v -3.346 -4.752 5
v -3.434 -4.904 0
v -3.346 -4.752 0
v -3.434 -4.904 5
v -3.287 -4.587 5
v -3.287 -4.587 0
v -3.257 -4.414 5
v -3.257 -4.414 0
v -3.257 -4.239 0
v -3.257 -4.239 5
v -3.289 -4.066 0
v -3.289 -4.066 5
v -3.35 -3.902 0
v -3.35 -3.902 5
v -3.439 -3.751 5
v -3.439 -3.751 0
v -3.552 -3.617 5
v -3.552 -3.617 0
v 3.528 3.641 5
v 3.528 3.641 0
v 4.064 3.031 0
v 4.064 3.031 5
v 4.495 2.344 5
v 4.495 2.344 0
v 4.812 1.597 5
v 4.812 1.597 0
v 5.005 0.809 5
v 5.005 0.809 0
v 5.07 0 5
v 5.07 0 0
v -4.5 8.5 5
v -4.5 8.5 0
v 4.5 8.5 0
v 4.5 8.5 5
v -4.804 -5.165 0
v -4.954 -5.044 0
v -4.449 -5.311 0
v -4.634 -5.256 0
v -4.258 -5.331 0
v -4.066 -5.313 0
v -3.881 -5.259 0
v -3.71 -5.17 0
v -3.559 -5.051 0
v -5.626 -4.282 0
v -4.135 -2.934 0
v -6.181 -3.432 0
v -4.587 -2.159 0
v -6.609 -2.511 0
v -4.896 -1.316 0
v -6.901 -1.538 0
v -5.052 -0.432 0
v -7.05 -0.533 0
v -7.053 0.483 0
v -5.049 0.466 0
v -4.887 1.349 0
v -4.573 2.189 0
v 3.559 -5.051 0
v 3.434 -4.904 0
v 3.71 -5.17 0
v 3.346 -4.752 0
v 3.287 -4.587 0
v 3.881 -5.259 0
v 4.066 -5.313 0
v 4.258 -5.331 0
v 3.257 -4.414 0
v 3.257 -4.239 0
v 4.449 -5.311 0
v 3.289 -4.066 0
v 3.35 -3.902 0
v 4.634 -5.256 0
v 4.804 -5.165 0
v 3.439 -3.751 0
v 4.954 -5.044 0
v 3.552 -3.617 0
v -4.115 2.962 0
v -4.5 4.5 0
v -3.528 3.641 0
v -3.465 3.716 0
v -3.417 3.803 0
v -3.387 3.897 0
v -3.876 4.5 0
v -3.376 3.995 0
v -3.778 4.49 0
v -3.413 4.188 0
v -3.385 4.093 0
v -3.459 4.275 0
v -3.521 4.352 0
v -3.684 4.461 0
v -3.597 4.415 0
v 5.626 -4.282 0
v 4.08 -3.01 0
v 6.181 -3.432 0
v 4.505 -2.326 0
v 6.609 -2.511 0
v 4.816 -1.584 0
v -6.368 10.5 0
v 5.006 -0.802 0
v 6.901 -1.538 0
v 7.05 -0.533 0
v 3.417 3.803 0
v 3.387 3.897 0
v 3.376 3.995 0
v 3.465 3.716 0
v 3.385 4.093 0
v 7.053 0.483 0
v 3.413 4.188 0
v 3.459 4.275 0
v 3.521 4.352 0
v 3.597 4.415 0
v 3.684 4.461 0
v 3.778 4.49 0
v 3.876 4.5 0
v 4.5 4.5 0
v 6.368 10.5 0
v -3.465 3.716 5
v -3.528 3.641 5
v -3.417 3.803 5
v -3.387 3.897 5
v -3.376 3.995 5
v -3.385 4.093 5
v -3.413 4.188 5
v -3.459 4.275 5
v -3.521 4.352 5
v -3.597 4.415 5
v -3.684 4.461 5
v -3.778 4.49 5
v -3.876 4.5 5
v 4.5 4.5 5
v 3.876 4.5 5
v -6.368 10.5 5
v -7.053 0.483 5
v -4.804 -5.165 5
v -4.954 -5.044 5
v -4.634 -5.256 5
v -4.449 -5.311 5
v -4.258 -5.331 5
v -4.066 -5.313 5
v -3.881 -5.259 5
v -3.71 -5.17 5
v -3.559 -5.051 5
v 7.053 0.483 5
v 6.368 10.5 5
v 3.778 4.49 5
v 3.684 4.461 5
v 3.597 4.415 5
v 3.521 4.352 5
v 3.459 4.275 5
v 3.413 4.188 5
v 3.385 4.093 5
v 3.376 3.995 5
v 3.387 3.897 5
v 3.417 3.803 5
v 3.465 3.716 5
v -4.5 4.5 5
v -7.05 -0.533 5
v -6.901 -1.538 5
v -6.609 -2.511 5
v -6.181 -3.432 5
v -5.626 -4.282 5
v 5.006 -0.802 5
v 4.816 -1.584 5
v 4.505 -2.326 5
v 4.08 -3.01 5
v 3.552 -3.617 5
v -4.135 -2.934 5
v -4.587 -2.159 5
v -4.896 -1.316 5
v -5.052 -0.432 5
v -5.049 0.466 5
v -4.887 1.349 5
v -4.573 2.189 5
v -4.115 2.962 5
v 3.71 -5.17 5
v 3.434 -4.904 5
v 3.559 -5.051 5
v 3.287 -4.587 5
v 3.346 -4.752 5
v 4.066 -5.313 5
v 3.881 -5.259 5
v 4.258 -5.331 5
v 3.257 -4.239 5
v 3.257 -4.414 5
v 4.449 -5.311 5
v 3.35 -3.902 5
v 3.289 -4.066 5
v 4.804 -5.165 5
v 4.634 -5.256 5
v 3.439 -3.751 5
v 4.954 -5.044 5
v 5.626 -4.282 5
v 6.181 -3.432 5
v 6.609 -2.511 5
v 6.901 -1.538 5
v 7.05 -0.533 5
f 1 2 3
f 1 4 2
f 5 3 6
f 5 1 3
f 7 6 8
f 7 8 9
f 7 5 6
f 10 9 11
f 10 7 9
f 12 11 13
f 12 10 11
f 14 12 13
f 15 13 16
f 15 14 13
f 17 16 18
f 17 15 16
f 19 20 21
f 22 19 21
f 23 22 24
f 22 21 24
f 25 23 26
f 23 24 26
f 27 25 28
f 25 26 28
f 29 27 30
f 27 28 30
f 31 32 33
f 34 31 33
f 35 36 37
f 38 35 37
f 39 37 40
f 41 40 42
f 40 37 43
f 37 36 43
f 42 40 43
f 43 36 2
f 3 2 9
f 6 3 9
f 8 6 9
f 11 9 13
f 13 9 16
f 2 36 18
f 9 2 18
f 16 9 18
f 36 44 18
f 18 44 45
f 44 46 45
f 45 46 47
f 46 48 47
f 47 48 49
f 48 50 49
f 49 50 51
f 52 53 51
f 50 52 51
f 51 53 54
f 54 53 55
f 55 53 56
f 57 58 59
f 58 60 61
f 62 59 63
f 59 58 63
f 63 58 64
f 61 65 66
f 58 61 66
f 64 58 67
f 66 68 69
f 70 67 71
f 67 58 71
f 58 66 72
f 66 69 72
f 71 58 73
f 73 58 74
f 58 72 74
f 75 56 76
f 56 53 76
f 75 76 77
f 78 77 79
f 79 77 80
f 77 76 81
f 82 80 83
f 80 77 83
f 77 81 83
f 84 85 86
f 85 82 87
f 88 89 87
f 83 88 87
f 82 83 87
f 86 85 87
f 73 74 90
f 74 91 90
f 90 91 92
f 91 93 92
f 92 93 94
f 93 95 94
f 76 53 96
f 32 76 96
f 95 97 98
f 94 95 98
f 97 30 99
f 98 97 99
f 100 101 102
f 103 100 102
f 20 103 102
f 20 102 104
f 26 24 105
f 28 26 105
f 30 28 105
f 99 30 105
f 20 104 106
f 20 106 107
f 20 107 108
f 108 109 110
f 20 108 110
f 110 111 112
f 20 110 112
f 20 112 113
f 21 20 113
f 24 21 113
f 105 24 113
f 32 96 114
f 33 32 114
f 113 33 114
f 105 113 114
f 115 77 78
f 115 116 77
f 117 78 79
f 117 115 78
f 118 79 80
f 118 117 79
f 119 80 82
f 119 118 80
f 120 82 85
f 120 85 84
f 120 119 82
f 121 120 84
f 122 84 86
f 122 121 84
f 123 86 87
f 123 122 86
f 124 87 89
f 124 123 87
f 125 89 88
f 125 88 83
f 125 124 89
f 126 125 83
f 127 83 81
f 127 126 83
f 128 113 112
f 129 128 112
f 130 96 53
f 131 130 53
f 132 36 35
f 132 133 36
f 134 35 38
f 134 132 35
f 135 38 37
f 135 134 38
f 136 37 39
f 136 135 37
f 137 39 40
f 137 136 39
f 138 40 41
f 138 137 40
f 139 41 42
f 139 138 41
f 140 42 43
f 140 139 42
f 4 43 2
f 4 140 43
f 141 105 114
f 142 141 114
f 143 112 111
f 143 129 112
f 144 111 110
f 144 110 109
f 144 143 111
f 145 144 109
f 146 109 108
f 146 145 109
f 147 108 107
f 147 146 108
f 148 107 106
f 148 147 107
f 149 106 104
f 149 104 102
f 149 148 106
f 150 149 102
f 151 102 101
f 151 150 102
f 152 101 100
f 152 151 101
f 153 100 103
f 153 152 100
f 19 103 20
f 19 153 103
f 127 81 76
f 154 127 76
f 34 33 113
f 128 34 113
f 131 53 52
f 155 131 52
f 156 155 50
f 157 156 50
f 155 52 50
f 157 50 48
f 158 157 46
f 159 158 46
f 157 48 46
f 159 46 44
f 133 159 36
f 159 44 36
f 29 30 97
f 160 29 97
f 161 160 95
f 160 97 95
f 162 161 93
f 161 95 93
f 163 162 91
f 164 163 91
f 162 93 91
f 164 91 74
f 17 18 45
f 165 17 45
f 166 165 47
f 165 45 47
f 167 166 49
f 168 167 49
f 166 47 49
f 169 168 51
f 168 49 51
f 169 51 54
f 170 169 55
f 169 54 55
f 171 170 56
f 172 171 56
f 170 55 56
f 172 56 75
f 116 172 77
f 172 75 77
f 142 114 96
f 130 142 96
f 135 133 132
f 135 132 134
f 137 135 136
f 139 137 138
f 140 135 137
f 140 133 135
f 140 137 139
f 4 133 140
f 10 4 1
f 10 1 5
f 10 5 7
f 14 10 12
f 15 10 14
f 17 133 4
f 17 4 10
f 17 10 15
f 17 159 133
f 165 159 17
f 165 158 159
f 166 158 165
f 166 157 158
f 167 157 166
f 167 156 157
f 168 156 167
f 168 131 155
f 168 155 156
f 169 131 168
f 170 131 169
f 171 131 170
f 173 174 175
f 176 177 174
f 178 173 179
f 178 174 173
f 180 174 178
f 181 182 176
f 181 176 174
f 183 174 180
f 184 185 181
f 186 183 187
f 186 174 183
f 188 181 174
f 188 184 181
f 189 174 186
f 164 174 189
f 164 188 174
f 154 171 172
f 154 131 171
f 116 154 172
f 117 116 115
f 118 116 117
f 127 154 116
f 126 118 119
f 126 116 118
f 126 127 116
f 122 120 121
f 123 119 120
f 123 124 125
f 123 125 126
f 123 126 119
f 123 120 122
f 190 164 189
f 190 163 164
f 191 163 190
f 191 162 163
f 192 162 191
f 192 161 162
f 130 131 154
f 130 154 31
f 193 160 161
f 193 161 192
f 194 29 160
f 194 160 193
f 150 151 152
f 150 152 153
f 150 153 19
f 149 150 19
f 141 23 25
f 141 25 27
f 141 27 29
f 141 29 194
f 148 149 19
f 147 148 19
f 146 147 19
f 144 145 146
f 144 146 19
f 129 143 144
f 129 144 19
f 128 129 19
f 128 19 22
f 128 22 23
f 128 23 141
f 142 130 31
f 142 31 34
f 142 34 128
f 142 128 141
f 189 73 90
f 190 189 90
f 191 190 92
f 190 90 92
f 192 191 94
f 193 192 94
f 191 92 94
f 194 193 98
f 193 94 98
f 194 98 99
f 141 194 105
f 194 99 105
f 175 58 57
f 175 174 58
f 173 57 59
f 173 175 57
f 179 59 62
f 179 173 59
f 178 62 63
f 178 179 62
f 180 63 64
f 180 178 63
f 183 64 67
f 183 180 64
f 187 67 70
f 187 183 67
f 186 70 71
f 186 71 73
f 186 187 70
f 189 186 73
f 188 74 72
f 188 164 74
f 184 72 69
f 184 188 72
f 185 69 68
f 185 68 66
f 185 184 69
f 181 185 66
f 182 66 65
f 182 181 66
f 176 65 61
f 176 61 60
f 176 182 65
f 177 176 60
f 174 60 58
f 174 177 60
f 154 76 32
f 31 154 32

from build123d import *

# Parameters (mm, degrees)
BOSS_EXTRUDE1_DEPTH = 5
FILLET1_R           = 1
FILLET3_R           = 0.5


with BuildPart() as part:
    # Sketch1 → Boss-Extrude1 (new body)
    with BuildSketch(Plane.XY):
        with BuildLine():
            Line((-6.367771102, 10.5), (-7.053492803, 0.482844987))
            ThreePointArc((-7.053492803, 0.482844987), (-6.379046634, -3.048387121), (-4.055185405, -5.791404953))
            Line((-4.055185405, -5.791404953), (-2.908032532, -4.153100865))
            ThreePointArc((-2.908032532, -4.153100865), (-5.058941361, 0.334682398), (-2.335572735, 4.5))
            Line((-2.335572735, 4.5), (-4.5, 4.5))
            Line((-4.5, 4.5), (-4.5, 8.5))
            Line((-4.5, 8.5), (4.5, 8.5))
            Line((4.5, 8.5), (4.5, 4.5))
            Line((4.5, 4.5), (2.335572735, 4.5))
            ThreePointArc((2.335572735, 4.5), (4.332796658, 2.63282607), (5.07, 0))
            ThreePointArc((5.07, 0), (4.497144924, -2.341065469), (2.908032532, -4.153100865))
            Line((2.908032532, -4.153100865), (4.055185405, -5.791404953))
            ThreePointArc((4.055185405, -5.791404953), (6.379046634, -3.048387121), (7.053492803, 0.482844987))
            Line((7.053492803, 0.482844987), (6.367771102, 10.5))
            Line((6.367771102, 10.5), (-6.367771102, 10.5))
        make_face()
    extrude(amount=BOSS_EXTRUDE1_DEPTH)

    # Fillet1
    fillet1_edges = [part.edges().sort_by_distance(p)[0] for p in [
        (4.055185405, -5.791404953, 2.5),
        (2.908032532, -4.153100865, 2.5),
        (-4.055185405, -5.791404953, 2.5),
        (-2.908032532, -4.153100865, 2.5),
    ]]
    fillet(fillet1_edges, radius=FILLET1_R - 0.0001)  # a hair under: the kernel refuses the full size

    # Fillet3
    fillet3_edges = [part.edges().sort_by_distance(p)[0] for p in [
        (2.335572735, 4.5, 2.5),
        (-2.335572735, 4.5, 2.5),
    ]]
    fillet(fillet3_edges, radius=FILLET3_R)


solid = part.part
